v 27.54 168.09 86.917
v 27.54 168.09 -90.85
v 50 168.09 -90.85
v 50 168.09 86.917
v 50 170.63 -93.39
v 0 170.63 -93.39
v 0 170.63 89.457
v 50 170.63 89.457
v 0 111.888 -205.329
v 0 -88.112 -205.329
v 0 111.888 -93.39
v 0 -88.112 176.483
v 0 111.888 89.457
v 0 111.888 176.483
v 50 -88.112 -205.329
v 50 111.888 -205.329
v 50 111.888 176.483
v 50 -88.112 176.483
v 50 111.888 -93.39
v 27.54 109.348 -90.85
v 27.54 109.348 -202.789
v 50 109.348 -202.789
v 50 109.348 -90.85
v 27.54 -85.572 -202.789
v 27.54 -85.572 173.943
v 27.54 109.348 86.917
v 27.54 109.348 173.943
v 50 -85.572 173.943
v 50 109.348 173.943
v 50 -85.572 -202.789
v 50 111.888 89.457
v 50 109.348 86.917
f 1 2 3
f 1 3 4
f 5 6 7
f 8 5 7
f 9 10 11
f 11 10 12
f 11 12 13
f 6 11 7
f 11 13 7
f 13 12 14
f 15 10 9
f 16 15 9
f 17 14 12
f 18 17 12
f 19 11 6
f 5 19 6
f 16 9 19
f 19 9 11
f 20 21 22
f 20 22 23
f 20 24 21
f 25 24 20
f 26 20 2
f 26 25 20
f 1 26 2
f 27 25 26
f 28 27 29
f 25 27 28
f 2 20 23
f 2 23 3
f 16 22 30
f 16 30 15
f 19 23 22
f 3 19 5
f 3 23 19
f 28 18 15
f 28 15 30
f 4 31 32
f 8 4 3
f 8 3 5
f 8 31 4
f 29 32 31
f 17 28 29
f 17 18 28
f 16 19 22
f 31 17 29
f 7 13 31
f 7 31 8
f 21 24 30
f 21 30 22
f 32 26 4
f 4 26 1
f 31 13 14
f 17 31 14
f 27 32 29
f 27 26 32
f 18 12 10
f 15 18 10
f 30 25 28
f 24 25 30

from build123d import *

# Parameters (mm, degrees)
F0_W     = 111.8879971261
F0_H     = 182.8464864036
F0_W_2   = 58.7416736197
F1_DEPTH = 50
F2_T     = -2.54
F3_DEPTH = 25
F4_R     = 48.7363148041
F5_DEPTH = 25
F6_DEPTH = 25


with BuildPart() as f1:
    # F0 (on Right) → F1 (new body)
    with BuildSketch(Plane.YZ):
        Polygon((0, -93.3897359272), (0, 89.4567504763), (111.8879971261, 89.4567504763), (111.8879971261, 176.4833948933), (-88.1120028739, 176.4833948933), (-88.1120028739, -205.3286014106), (111.8879971261, -205.3286014106), (111.8879971261, -93.3897359272), align=None)
        with Locations((55.9439985631, -1.9664927255)):
            Rectangle(F0_W, F0_H)
        with Locations((141.258833936, -1.9664927255)):
            Rectangle(F0_W_2, F0_H)
    extrude(amount=F1_DEPTH)

    # F2
    f2_openings = [f1.faces().sort_by_distance(p)[0] for p in [
        (50, 27.840751, -12.886637),
    ]]
    offset(amount=F2_T, openings=f2_openings, kind=Kind.INTERSECTION)

    # F3 (add): a face of the model
    f3_faces = [f1.faces().sort_by_distance(p)[0] for p in [
        (2.54, 27.6782483044, -12.8718359613),
    ]]
    extrude(f3_faces, amount=F3_DEPTH)

    # F4 (on face) → F5 (join)
    with BuildSketch(Plane.YZ.offset(27.54)):
        Circle(F4_R)
    extrude(amount=F5_DEPTH)

    # F6 (cut): a face of the model
    f6_faces = [f1.faces().sort_by_distance(p)[0] for p in [
        (52.54, 0, 0),
    ]]
    extrude(f6_faces, amount=-F6_DEPTH, mode=Mode.SUBTRACT)


solid = f1.part
